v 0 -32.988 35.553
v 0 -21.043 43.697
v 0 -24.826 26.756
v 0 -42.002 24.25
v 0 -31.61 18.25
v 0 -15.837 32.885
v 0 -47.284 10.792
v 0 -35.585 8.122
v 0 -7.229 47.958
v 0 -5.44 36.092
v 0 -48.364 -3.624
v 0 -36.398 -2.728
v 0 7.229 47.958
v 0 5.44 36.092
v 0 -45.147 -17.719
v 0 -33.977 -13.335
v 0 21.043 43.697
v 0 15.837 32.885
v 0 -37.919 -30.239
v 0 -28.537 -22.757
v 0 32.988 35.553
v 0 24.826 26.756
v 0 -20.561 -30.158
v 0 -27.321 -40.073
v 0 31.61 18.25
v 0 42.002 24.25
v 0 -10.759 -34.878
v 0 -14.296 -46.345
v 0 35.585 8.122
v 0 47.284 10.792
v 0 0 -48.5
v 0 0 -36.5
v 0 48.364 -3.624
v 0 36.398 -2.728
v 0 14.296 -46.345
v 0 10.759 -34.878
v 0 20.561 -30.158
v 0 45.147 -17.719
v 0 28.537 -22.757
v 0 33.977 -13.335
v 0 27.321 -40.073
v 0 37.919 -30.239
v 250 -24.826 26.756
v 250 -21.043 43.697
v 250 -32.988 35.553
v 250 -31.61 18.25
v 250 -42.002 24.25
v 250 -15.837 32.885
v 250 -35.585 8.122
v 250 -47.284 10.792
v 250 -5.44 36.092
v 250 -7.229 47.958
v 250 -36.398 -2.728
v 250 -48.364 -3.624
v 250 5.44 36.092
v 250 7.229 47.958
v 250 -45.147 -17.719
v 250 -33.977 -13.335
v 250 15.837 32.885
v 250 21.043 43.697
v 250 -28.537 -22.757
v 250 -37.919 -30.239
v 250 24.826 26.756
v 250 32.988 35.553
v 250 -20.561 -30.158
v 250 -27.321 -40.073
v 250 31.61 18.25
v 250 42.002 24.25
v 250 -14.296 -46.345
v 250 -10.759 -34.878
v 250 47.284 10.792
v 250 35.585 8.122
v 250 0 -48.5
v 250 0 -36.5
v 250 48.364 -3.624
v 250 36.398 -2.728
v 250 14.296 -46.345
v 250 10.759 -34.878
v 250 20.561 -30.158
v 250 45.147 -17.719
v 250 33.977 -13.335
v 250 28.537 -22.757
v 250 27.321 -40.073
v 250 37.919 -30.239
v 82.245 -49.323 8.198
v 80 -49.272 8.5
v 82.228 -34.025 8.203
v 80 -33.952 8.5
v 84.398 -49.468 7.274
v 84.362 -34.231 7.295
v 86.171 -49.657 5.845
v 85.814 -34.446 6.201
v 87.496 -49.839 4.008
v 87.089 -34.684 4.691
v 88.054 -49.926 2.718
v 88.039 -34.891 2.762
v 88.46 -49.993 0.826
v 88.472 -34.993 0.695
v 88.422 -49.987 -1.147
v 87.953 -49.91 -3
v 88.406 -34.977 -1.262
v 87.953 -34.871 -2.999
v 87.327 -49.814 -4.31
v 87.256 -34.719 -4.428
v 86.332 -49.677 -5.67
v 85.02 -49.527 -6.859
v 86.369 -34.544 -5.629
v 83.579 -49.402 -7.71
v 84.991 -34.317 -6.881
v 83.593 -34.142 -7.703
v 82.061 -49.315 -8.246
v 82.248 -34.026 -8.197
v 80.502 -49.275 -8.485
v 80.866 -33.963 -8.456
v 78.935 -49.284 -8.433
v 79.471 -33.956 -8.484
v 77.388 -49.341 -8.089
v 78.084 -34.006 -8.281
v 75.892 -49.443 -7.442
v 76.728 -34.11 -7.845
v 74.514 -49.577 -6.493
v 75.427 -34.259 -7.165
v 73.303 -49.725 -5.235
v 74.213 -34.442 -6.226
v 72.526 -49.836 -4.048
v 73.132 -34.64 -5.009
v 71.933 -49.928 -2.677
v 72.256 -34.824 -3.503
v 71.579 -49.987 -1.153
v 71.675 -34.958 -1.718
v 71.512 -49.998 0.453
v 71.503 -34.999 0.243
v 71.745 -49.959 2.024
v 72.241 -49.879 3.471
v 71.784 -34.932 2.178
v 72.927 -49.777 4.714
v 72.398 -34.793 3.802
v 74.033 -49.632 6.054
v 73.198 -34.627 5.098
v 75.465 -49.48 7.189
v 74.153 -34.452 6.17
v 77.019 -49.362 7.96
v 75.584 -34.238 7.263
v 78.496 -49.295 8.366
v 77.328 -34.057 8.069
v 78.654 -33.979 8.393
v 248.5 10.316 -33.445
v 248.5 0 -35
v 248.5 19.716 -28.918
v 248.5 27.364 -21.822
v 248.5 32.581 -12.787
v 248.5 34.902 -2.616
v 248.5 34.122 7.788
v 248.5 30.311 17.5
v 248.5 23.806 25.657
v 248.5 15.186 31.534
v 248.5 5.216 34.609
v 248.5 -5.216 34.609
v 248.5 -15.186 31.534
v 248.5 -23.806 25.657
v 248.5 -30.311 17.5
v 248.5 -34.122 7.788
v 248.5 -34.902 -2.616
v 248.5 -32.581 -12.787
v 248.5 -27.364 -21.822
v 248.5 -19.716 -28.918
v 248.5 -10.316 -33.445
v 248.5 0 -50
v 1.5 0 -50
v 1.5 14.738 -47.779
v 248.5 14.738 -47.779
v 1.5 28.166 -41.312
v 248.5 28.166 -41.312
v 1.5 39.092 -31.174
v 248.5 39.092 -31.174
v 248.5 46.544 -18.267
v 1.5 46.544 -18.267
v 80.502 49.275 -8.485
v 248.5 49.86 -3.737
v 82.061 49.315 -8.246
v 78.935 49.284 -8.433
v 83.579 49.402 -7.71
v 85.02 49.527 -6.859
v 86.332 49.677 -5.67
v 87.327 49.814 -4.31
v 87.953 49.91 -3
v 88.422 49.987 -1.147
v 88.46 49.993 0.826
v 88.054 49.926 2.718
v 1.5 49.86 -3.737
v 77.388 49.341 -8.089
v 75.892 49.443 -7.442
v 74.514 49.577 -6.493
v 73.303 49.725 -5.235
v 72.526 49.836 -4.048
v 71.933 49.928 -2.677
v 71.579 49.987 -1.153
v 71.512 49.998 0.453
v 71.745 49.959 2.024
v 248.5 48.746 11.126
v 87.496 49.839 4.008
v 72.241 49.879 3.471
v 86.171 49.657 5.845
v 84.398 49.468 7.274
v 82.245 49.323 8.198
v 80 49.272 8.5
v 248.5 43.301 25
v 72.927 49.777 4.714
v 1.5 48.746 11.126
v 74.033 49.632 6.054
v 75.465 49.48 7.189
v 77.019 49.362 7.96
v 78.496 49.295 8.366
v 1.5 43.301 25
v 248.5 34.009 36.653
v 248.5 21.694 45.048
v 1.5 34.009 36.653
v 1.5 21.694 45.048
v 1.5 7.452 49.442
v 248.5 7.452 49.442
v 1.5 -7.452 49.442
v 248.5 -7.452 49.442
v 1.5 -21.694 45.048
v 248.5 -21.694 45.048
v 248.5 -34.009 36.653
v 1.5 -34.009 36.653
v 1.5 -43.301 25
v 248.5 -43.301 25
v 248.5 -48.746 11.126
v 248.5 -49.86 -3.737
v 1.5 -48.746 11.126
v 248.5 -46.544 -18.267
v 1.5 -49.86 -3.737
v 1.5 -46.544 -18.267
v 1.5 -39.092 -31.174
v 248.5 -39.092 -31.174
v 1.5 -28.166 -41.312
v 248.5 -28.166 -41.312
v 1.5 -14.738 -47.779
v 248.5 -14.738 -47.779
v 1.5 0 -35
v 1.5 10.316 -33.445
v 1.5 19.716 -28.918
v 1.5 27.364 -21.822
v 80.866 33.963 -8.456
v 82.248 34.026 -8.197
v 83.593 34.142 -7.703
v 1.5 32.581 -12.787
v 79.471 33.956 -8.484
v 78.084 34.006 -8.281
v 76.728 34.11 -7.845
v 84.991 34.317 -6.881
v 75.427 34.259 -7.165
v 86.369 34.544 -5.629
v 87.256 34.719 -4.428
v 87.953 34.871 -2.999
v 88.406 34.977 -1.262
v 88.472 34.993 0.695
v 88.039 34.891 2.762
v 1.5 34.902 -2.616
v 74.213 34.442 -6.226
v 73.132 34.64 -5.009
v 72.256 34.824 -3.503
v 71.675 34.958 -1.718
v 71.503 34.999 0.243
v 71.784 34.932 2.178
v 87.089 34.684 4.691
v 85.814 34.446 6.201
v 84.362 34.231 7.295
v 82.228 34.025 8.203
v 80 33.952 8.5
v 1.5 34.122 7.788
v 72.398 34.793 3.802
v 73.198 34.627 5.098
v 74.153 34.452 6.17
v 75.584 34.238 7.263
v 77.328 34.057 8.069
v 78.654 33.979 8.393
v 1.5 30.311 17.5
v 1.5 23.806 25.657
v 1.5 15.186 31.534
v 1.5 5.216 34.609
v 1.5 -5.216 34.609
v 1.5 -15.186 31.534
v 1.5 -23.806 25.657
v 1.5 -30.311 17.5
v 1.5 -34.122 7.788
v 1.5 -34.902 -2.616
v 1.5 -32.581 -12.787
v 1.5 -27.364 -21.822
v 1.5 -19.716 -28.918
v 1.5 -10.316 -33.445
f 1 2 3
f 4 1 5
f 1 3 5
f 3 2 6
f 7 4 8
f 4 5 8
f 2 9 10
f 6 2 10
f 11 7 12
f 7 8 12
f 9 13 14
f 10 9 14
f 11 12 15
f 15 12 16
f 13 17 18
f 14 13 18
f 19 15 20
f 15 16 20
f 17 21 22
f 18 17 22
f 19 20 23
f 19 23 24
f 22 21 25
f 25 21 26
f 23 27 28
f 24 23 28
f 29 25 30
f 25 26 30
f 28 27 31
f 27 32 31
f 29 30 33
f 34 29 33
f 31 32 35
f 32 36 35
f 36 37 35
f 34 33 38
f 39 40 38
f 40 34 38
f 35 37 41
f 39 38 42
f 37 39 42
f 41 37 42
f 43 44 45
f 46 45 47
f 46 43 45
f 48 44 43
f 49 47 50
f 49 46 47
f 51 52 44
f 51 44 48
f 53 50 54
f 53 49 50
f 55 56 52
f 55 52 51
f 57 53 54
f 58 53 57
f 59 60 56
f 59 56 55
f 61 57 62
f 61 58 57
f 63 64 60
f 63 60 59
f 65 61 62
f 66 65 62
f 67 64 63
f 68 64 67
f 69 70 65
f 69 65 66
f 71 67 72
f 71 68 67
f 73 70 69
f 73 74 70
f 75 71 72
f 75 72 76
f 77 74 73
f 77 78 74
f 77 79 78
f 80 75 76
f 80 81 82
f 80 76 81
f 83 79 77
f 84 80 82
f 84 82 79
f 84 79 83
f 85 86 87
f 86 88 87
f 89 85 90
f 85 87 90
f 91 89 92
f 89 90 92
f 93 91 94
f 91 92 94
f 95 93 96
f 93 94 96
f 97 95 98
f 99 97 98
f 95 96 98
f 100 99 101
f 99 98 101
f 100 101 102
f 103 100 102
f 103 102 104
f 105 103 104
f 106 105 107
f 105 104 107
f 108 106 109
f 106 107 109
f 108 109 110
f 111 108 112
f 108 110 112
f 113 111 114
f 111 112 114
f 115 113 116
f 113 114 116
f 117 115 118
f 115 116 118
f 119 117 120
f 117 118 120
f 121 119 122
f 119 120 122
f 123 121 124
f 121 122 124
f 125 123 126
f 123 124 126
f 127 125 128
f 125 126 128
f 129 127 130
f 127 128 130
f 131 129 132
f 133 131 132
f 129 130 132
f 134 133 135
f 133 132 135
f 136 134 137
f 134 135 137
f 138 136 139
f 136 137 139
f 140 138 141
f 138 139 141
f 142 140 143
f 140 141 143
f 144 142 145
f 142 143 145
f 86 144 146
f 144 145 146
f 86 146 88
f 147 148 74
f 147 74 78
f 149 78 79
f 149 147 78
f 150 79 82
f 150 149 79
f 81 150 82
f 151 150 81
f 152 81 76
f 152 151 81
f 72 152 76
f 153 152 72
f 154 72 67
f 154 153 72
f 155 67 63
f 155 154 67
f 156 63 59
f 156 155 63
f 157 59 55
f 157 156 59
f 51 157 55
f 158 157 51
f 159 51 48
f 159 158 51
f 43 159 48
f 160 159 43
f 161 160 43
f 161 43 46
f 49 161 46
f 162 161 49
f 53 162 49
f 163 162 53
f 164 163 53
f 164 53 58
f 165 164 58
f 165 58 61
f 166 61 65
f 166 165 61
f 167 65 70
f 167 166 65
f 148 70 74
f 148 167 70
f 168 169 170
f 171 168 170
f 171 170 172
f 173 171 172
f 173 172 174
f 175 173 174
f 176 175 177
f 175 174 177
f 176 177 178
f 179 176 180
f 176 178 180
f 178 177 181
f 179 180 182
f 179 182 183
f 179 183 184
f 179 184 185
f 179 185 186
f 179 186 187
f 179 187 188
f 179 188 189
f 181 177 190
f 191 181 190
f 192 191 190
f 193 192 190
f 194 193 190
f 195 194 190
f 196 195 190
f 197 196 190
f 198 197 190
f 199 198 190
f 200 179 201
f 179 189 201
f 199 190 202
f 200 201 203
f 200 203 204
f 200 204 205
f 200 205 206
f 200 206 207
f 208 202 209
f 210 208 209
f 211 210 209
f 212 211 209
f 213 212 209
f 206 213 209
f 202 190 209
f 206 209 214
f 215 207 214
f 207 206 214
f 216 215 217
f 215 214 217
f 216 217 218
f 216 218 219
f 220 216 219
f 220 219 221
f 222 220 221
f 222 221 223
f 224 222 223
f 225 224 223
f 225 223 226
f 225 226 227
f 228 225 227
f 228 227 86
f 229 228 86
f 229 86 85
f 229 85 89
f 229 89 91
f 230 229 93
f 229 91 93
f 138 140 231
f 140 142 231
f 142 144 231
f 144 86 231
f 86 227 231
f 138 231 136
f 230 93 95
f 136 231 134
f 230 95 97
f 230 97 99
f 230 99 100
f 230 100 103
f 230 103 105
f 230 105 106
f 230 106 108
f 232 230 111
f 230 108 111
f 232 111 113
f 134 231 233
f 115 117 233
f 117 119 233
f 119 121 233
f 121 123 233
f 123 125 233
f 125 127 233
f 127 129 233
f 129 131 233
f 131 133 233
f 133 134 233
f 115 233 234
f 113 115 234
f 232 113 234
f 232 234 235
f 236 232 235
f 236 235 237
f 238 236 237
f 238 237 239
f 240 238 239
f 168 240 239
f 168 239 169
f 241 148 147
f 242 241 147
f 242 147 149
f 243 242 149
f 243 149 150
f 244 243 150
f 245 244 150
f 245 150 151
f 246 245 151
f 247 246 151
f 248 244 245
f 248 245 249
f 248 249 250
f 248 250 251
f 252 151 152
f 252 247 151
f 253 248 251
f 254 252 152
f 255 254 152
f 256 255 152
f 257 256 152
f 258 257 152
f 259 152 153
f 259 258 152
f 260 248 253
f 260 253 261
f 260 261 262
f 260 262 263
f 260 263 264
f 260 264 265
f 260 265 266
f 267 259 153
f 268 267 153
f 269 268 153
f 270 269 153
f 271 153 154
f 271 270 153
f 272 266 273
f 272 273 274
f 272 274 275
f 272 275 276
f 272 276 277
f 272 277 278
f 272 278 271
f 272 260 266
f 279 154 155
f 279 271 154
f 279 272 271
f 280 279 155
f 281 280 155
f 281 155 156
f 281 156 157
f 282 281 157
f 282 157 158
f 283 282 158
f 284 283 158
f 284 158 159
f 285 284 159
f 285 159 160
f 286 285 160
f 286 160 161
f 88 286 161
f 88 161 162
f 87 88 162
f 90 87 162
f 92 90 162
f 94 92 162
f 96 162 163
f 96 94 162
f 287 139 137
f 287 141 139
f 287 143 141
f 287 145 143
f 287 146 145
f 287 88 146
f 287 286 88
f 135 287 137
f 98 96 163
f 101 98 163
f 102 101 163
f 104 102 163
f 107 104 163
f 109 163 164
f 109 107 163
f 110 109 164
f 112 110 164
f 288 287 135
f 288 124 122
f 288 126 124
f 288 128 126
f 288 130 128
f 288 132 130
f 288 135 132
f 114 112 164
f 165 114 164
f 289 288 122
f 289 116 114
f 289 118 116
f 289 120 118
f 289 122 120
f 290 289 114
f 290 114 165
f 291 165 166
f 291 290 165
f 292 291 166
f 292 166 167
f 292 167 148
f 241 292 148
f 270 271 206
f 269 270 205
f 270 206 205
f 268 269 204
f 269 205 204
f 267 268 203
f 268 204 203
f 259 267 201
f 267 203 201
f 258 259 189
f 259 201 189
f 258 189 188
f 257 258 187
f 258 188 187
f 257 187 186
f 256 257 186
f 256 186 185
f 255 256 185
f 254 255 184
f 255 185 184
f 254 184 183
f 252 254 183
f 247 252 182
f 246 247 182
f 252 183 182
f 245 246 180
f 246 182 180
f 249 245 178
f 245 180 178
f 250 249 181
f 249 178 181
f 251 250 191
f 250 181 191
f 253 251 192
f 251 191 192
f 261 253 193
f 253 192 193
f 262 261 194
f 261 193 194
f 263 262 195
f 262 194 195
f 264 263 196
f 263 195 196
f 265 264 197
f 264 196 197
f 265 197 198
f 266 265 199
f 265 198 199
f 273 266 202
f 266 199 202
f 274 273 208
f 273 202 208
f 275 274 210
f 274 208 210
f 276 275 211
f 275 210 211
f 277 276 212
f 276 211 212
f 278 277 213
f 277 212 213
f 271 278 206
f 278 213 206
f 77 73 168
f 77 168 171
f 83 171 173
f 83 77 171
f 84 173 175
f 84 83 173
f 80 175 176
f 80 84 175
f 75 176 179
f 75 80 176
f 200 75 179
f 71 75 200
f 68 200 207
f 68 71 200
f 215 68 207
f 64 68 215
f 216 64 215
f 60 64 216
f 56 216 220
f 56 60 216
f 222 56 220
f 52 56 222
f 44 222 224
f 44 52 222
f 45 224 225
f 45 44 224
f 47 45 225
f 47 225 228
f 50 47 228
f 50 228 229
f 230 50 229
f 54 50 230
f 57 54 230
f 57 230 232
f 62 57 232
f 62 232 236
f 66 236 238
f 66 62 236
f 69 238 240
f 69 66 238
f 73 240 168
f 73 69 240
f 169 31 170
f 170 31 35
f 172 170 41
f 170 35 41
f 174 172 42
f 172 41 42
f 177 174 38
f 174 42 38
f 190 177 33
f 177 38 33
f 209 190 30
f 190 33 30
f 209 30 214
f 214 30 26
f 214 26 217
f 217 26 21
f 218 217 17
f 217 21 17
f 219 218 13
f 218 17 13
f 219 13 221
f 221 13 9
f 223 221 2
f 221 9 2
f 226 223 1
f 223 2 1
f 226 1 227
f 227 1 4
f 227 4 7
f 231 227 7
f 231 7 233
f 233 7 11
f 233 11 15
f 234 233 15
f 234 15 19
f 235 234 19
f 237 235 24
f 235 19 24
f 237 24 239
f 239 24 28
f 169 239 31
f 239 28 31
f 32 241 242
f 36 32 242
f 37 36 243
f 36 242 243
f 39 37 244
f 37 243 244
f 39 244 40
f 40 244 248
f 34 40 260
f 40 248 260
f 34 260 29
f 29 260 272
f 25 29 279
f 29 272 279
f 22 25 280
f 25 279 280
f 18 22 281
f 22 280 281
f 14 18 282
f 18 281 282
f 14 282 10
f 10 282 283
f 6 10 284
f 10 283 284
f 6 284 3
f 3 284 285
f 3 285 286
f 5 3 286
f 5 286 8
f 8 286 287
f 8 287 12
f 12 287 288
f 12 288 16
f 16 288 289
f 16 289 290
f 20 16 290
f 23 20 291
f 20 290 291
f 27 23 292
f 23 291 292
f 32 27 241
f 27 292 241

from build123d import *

# Parameters (mm, degrees)
SKETCH_1_R          = 50
SKETCH_1_R_2        = 35
EXTRUDE_1_DEPTH     = 250
SKETCH_2_R          = 8.5
CUT_EXTRUDE_1_DEPTH = 430
CHAMFER_1_SIZE      = 1.5


with BuildPart() as part:
    # 草图1 → 凸台-拉伸1 (new body)
    with BuildSketch(Plane(origin=(0, 0, 0), x_dir=(0, 0, -1), z_dir=(1, 0, 0))):
        Circle(SKETCH_1_R)
        Circle(SKETCH_1_R_2, mode=Mode.SUBTRACT)
    extrude(amount=EXTRUDE_1_DEPTH)

    # 草图2 → 切除-拉伸1 (cut, symmetric)
    with BuildSketch(Plane(origin=(0, 0, 0), x_dir=(1, 0, 0), z_dir=(0, 1, 0))):
        with Locations((80, 0)):
            Circle(SKETCH_2_R)
    extrude(amount=CUT_EXTRUDE_1_DEPTH, both=True, mode=Mode.SUBTRACT)

    # 倒角1
    chamfer_1_edges = [part.edges().sort_by_distance(p)[0] for p in [
        (0, 0, 50),
        (250, 0, 50),
        (0, 0, 35),
        (250, 0, 35),
    ]]
    chamfer(chamfer_1_edges, length=CHAMFER_1_SIZE)


solid = part.part
